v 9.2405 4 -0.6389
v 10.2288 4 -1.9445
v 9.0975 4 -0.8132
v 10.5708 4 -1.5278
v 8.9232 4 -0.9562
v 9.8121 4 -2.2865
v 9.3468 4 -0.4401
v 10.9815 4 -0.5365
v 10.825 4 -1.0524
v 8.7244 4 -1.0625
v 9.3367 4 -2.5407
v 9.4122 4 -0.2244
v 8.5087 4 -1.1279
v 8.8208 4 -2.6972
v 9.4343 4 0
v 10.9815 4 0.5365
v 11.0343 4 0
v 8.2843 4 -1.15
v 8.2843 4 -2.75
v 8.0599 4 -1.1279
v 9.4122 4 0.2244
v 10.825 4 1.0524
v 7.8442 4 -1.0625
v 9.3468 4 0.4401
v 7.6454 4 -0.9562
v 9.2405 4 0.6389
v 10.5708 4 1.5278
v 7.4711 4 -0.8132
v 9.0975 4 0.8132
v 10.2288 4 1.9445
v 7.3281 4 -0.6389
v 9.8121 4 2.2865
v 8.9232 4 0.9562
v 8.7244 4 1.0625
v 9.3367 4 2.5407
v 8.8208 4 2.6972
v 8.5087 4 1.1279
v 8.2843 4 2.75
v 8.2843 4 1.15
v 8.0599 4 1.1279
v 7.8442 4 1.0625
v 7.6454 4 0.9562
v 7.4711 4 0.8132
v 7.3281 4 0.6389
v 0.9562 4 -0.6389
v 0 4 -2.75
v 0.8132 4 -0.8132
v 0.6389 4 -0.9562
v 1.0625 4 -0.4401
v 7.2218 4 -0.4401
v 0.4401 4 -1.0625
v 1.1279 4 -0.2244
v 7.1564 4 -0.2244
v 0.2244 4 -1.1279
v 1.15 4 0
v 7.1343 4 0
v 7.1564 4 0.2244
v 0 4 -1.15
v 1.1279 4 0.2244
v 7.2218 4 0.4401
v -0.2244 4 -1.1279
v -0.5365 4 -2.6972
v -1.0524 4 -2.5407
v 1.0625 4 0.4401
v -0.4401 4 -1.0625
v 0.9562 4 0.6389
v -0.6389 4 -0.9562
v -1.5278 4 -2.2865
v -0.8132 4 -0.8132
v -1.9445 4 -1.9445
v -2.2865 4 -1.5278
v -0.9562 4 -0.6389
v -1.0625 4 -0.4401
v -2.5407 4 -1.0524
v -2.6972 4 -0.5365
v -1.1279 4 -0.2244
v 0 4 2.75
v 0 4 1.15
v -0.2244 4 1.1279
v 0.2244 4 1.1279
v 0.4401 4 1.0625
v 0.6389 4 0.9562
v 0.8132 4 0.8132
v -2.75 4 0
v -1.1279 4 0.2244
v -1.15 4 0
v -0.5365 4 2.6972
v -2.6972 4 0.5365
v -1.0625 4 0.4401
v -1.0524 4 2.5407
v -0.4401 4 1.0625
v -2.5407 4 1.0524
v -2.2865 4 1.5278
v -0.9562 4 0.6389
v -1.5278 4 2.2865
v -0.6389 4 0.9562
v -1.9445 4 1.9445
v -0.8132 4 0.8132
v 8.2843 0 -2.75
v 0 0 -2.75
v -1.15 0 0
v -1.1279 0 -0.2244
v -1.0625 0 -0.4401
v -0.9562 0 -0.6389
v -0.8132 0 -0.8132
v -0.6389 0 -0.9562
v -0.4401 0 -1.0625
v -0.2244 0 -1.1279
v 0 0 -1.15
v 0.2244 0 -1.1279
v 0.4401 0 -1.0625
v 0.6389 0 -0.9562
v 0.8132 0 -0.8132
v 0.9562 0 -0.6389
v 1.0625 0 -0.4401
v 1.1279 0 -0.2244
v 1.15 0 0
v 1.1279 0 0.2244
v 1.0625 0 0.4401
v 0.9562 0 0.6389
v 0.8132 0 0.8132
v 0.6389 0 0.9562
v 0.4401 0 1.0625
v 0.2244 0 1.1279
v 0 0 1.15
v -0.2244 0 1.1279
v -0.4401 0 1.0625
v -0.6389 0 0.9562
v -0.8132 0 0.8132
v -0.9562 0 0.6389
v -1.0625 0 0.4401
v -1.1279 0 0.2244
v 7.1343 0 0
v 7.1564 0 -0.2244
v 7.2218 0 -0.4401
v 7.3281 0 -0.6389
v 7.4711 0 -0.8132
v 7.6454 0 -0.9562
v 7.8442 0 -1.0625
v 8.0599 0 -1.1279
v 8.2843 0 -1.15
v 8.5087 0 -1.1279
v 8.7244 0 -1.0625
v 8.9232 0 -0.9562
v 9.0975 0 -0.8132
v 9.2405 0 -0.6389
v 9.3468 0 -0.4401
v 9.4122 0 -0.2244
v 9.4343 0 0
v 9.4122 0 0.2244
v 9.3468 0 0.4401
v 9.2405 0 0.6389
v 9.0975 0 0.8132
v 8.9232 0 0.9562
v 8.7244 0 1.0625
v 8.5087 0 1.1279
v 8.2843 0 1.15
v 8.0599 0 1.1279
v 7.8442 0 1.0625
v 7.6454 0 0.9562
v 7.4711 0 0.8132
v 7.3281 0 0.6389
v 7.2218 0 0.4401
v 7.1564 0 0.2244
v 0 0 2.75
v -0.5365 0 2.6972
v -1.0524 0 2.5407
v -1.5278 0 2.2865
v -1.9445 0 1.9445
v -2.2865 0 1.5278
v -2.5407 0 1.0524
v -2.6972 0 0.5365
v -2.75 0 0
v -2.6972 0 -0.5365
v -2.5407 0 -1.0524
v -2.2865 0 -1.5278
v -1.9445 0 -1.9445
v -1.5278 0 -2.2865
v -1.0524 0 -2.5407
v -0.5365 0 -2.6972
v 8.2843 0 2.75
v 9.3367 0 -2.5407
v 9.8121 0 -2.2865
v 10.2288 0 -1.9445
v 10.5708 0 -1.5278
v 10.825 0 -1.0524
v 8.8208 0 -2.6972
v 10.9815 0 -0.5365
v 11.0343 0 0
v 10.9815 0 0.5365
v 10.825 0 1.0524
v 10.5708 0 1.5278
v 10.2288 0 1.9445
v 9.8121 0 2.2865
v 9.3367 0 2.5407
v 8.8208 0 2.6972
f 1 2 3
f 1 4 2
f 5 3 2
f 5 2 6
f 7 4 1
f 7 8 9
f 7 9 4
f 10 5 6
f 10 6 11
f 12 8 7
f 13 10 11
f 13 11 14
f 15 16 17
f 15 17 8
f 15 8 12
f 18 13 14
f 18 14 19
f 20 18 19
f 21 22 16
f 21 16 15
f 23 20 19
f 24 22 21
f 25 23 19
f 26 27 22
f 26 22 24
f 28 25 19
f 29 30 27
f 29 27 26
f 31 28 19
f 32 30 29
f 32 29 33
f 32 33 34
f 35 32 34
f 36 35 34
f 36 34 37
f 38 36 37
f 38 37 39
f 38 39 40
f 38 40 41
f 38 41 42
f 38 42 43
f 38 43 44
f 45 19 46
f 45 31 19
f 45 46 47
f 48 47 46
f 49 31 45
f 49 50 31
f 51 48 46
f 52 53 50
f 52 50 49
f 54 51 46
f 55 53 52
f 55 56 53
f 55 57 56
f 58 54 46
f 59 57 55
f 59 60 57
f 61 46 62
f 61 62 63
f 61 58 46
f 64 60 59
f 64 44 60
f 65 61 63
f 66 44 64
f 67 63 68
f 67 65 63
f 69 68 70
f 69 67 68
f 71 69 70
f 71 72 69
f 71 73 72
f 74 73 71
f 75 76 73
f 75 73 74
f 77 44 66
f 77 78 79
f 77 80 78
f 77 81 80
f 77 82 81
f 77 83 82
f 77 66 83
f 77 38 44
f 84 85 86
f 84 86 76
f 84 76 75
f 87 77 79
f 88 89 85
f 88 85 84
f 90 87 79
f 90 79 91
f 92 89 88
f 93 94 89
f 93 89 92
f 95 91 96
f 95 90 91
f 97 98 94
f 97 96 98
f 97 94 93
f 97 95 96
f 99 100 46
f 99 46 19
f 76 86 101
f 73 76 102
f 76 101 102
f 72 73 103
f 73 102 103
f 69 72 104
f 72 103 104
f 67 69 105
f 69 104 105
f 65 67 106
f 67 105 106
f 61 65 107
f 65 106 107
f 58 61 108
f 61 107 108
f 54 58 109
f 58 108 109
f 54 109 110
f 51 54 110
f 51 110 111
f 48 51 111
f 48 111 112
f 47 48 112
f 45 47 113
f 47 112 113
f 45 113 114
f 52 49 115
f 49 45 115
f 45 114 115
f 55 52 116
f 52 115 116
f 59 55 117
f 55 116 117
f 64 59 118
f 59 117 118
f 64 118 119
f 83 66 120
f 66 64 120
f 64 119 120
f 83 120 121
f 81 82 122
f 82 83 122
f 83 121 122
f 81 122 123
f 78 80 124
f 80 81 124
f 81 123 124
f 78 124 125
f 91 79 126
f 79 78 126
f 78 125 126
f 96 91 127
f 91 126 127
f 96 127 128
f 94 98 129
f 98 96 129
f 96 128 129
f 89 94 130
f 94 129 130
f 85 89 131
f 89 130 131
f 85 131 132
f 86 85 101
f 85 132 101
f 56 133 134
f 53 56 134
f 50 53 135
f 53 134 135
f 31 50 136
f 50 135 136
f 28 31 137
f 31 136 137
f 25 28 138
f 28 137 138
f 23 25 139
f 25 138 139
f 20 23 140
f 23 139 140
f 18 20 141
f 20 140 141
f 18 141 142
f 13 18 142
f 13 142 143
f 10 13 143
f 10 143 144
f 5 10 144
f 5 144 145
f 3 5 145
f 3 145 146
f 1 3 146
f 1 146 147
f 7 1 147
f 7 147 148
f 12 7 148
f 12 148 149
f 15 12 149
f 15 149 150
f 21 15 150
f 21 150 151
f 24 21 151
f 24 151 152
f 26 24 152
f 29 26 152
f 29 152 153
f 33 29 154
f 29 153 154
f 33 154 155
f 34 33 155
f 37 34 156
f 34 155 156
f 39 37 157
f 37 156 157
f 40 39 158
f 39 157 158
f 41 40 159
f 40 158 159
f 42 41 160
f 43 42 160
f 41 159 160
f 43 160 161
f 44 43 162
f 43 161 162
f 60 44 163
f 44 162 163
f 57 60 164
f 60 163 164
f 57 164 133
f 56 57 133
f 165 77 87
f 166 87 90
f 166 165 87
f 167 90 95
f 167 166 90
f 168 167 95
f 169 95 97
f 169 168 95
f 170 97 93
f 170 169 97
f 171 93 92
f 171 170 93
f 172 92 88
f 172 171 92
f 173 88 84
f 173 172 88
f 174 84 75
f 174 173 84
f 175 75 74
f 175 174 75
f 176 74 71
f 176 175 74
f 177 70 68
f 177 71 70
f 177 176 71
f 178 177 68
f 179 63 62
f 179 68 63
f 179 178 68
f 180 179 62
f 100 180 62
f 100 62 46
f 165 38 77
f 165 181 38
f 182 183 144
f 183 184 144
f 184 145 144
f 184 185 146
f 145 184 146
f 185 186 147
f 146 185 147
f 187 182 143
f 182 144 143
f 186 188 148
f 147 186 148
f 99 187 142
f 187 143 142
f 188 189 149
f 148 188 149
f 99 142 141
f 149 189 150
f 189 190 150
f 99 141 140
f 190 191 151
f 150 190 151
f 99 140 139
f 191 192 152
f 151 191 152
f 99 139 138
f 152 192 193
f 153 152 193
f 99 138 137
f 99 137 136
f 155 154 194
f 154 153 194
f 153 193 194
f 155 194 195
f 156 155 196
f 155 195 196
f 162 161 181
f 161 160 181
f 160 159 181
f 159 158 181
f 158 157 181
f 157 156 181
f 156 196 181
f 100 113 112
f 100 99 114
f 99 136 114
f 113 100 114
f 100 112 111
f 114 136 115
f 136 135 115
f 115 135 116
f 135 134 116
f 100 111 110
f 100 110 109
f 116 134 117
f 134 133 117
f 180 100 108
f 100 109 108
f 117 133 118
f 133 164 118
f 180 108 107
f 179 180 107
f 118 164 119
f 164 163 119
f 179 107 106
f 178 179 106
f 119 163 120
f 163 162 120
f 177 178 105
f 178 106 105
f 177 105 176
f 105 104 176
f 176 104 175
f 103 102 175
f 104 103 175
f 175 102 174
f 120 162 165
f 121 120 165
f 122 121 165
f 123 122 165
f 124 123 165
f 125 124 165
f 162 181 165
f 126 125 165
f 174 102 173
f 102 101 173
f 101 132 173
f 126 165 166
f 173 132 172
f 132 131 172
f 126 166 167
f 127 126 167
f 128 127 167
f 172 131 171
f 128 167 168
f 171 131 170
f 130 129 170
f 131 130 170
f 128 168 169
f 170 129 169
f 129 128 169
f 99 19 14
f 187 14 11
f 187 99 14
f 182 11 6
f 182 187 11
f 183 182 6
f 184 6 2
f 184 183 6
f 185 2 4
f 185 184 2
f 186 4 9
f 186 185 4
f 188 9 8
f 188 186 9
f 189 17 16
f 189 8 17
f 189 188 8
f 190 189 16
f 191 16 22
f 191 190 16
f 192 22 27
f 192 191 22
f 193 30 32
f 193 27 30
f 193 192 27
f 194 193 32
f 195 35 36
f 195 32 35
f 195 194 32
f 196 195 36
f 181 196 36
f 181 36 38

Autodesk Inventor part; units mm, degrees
ref_plane "YZ Plane" through (0, 0, 0) normal (1, 0, 0) x (0, 1, 0)
ref_plane "XZ Plane" through (0, 0, 0) normal (0, 1, 0) x (-1, 0, 0)
ref_plane "XY Plane" through (0, 0, 0) normal (0, 0, 1) x (1, 0, 0)
sketch "スケッチ1" plane through (0, 0, 0) normal (0, 1, 0) x (-1, 0, 0)
  circle A0 centre (0, 0) radius 1.15
  circle A1 centre (0, 0) radius 2.75
  circle A2 centre (-8.2843, 0) radius 2.75
  circle A3 centre (-8.2843, 0) radius 1.15
  line L0 (0, -2.75) -> (-8.2843, -2.75)
  line L1 (-8.2843, -2.75) -> (-8.2843, 2.75) construction
  line L2 (-8.2843, 2.75) -> (0, 2.75)
  line L3 (0, 2.75) -> (0, -2.75) construction
  line L4 (-3.55, -2.75) -> (-4.7343, -2.75)
  line L5 (-4.7343, -2.75) -> (-4.7343, 2.75)
  line L6 (-4.7343, 2.75) -> (-3.55, 2.75)
  line L7 (-3.55, 2.75) -> (-3.55, -2.75)
  circle A4 centre (0, 0) radius 3.55 construction
  circle A5 centre (-8.2843, 0) radius 3.55 construction
  circle A6 centre (-4.1421, 10) radius 10
  line L8 (0, 0) -> (-8.2843, 0)
  line L9 (-4.1421, 10) -> (0, 0)
  line L10 (-8.2843, 0) -> (-4.1421, 10)
  point P0 (-3.55, 2.75)
  point P1 (-4.7343, -2.75)
  point P2 (-8.2843, -2.75)
  point P3 (0, 2.75)
  point P4 (-4.1421, 0)
  point P5 (-4.1421, 0)
  point P6 (-4.7343, 0)
  point P7 (-3.55, 0)
  point P8 (-4.7343, 0.0175)
  point P9 (-3.55, 0.0175)
  dimension "d1" = 5.5
  dimension "d0" = 2.3
  dimension "d7" = 7.1
  dimension "d8" = 7.1
  dimension "d9" = 20
  dimension "d10" = 45
extrude "押し出し2" add sketch "スケッチ1" along normal blind 4 contours A0 A6 A1 L8 | A0 L9 A1 A6 | L8 A1 A6 A0 | A0 A6 A1 L9 | L8 L7 A6 A1 | A1 L0 L7 L8 | L9 L2 A1 | A1 A6 L7 L2 L9 | L8 A6 L7 | L7 L0 L5 L8 | A6 A3 L8 A2 | A2 L10 A3 A6 | A6 L5 L2 L7 | L8 L5 A6 | L2 L10 A2 | A2 L8 L5 L0 | A6 A2 L10 L2 L5 | L5 L8 A2 A6 | A2 A6 A3 L10 | L8 A3 A6 A2
properties part number "chain_2"
